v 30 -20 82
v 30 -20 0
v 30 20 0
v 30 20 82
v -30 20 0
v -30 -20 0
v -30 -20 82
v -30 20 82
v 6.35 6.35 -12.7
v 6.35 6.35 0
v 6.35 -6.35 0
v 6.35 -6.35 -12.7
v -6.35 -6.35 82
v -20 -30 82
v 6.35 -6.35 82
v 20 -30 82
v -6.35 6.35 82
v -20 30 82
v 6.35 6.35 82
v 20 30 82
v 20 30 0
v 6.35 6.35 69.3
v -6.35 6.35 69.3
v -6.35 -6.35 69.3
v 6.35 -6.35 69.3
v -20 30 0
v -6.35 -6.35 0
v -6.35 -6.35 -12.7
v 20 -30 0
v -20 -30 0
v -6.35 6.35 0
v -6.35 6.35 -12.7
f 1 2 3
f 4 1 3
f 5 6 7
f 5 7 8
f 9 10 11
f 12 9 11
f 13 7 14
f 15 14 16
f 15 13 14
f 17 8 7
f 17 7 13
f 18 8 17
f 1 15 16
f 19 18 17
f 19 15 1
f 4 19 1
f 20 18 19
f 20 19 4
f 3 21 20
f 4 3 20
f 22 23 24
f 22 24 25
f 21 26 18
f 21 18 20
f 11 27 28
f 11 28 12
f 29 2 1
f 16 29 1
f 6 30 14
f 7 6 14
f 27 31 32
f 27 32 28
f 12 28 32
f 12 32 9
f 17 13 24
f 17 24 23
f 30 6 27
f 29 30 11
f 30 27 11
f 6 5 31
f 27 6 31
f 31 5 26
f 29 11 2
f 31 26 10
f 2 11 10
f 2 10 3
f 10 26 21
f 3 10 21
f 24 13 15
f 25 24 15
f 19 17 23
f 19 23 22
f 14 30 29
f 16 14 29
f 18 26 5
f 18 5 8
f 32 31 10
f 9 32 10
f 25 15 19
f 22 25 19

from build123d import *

# Parameters (mm, degrees)
F0_W     = 60
F0_H     = 60
F1_DEPTH = 82
F2_SIZE  = 10
F3_W     = 12.7
F3_H     = 12.7
F4_DEPTH = 12.7
F5_W     = 12.7
F5_H     = 12.7
F6_DEPTH = 12.7


with BuildPart() as f1:
    # F0 (on Top) → F1 (new body)
    with BuildSketch(Plane.XY):
        Rectangle(F0_W, F0_H)
    extrude(amount=F1_DEPTH)

    # F2
    f2_edges = [f1.edges().sort_by_distance(p)[0] for p in [
        (30, -30, 41),
        (30, 30, 41),
        (-30, -30, 41),
        (-30, 30, 41),
    ]]
    chamfer(f2_edges, length=F2_SIZE)

    # F3 (on face) → F4 (cut)
    with BuildSketch(Plane.XY.offset(82)):
        Rectangle(F3_W, F3_H)
    extrude(amount=-F4_DEPTH, mode=Mode.SUBTRACT)

    # F5 (on face) → F6 (join)
    with BuildSketch(Plane(origin=(0, 0, 0), x_dir=(1, 0, 0), z_dir=(0, 0, -1))):
        Rectangle(F5_W, F5_H)
    extrude(amount=F6_DEPTH)


solid = f1.part
